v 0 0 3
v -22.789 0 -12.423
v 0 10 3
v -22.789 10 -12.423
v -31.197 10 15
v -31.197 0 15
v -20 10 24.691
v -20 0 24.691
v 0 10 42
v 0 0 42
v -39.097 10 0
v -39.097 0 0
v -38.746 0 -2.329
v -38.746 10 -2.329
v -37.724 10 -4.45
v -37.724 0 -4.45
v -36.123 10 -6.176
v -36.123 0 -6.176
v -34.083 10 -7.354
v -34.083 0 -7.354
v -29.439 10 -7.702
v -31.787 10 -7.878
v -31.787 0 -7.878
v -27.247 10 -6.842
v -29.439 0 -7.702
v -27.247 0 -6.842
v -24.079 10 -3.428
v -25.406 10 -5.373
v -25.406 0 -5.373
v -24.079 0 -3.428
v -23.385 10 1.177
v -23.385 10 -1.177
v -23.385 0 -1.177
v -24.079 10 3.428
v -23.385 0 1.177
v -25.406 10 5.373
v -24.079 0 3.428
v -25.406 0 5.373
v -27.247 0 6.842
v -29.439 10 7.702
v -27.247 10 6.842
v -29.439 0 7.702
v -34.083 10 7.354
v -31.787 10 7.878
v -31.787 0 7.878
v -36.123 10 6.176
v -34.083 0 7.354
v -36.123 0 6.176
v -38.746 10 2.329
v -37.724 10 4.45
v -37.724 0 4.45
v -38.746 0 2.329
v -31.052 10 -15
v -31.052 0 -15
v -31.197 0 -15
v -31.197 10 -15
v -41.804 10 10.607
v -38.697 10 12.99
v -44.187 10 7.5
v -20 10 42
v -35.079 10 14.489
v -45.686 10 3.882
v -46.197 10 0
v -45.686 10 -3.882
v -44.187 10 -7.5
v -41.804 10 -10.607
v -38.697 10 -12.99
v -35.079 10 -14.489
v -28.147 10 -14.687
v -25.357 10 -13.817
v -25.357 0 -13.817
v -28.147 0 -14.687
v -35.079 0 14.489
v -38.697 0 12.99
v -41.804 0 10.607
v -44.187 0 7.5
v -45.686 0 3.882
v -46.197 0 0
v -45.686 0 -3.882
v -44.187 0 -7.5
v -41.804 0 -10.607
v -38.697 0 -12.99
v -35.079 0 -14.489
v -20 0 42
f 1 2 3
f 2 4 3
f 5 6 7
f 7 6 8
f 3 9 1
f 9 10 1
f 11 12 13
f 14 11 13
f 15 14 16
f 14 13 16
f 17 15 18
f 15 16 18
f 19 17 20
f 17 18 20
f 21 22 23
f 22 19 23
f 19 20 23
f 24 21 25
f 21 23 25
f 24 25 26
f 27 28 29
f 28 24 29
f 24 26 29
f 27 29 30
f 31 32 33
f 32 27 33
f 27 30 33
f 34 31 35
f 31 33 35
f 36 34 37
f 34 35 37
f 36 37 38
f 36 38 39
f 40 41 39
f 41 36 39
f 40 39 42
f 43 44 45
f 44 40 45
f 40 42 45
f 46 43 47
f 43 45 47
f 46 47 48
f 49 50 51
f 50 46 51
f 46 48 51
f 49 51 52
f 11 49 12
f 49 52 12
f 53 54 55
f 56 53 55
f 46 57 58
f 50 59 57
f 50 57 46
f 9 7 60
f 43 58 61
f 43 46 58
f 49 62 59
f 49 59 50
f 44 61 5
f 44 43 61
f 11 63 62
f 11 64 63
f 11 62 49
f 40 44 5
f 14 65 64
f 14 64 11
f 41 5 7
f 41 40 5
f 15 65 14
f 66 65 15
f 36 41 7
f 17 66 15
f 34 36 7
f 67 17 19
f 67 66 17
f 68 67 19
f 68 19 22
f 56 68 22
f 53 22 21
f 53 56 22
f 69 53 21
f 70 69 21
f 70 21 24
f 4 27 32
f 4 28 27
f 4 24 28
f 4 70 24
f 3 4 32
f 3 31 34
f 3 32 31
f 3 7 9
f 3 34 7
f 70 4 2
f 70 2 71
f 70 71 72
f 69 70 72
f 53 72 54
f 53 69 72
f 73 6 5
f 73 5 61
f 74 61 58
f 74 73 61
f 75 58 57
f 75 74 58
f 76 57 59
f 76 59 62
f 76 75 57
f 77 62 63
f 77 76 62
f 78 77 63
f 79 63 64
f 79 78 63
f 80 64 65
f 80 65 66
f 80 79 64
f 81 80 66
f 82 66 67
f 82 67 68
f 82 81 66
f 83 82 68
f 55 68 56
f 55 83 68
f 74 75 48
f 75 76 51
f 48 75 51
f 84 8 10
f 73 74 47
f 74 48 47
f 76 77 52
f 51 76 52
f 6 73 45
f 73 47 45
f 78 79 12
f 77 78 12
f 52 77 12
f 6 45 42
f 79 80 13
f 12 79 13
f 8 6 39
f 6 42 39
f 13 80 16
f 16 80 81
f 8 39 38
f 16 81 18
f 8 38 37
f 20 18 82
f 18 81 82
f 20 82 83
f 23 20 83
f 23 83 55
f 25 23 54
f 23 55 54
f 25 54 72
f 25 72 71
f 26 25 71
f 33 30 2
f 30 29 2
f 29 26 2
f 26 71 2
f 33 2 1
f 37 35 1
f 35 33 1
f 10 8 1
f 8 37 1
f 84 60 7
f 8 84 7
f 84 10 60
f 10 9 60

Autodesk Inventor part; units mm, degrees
ref_plane "YZ Plane" through (0, 0, 0) normal (1, 0, 0) x (0, 1, 0)
ref_plane "XZ Plane" through (0, 0, 0) normal (0, 1, 0) x (-1, 0, 0)
ref_plane "XY Plane" through (0, 0, 0) normal (0, 0, 1) x (1, 0, 0)
sketch "Sketch1" plane through (0, 0, 0) normal (0, 1, 0) x (-1, 0, 0)
  circle A0 centre (31.197, 0) radius 7.9
  line L0 (46.197, 15) -> (0, 15)
  line L1 (0, 15) -> (0, -15)
  line L2 (0, -15) -> (46.197, -15)
  line L3 (46.197, -15) -> (46.197, 15)
  circle A1 centre (31.197, 0) radius 15
  line L4 (46.197, 15) -> (0, 15)
  line L5 (0, 15) -> (0, 42)
  line L6 (0, 42) -> (46.197, 42)
  line L7 (46.197, 42) -> (46.197, 15)
  line L8 (31.197, 15) -> (0, 42)
  point P0 (0, 0)
  point P1 (0, 0)
  point P2 (31.197, -15)
  dimension "d0" = 15.8
  dimension "d1" = 31.197
  dimension "d2" = 42
extrude "Extrusion1" add sketch "Sketch1" along normal blind 10 contours A1 L2 L1 L0 | A1 | L0 L5 L8
sketch "Sketch3" plane through (0, 10, 0) normal (0, 1, 0) x (1, 0, 0)
  circle A0 centre (-31.197, 0) radius 7.9 projected
  circle A1 centre (-31.197, 0) radius 15.0007
  line L0 (-22.7894, 12.4231) -> (0, -3)
  line L1 (0, -42) -> (0, 15) projected
  line L2 (0, -3) -> (0, 15)
  line L3 (0, 15) -> (-31.1967, 15.0007)
  point P0 (0, 0)
extrude "Extrusion2" cut sketch "Sketch3" against normal blind 10 contours A1 L3 L1 L0
sketch "Sketch4" plane through (0, 10, 0) normal (0, 1, 0) x (1, 0, 0)
  line L0 (0, -42) -> (-20, -42)
  line L1 (-20, -42) -> (-20, -24)
  line L2 (-20, -24) -> (0, -24)
  line L3 (0, -24) -> (0, -42)
  point P0 (0, 0)
extrude "Extrusion3" add sketch "Sketch4" against normal blind 10
properties part number "TrubaDerzanka"
